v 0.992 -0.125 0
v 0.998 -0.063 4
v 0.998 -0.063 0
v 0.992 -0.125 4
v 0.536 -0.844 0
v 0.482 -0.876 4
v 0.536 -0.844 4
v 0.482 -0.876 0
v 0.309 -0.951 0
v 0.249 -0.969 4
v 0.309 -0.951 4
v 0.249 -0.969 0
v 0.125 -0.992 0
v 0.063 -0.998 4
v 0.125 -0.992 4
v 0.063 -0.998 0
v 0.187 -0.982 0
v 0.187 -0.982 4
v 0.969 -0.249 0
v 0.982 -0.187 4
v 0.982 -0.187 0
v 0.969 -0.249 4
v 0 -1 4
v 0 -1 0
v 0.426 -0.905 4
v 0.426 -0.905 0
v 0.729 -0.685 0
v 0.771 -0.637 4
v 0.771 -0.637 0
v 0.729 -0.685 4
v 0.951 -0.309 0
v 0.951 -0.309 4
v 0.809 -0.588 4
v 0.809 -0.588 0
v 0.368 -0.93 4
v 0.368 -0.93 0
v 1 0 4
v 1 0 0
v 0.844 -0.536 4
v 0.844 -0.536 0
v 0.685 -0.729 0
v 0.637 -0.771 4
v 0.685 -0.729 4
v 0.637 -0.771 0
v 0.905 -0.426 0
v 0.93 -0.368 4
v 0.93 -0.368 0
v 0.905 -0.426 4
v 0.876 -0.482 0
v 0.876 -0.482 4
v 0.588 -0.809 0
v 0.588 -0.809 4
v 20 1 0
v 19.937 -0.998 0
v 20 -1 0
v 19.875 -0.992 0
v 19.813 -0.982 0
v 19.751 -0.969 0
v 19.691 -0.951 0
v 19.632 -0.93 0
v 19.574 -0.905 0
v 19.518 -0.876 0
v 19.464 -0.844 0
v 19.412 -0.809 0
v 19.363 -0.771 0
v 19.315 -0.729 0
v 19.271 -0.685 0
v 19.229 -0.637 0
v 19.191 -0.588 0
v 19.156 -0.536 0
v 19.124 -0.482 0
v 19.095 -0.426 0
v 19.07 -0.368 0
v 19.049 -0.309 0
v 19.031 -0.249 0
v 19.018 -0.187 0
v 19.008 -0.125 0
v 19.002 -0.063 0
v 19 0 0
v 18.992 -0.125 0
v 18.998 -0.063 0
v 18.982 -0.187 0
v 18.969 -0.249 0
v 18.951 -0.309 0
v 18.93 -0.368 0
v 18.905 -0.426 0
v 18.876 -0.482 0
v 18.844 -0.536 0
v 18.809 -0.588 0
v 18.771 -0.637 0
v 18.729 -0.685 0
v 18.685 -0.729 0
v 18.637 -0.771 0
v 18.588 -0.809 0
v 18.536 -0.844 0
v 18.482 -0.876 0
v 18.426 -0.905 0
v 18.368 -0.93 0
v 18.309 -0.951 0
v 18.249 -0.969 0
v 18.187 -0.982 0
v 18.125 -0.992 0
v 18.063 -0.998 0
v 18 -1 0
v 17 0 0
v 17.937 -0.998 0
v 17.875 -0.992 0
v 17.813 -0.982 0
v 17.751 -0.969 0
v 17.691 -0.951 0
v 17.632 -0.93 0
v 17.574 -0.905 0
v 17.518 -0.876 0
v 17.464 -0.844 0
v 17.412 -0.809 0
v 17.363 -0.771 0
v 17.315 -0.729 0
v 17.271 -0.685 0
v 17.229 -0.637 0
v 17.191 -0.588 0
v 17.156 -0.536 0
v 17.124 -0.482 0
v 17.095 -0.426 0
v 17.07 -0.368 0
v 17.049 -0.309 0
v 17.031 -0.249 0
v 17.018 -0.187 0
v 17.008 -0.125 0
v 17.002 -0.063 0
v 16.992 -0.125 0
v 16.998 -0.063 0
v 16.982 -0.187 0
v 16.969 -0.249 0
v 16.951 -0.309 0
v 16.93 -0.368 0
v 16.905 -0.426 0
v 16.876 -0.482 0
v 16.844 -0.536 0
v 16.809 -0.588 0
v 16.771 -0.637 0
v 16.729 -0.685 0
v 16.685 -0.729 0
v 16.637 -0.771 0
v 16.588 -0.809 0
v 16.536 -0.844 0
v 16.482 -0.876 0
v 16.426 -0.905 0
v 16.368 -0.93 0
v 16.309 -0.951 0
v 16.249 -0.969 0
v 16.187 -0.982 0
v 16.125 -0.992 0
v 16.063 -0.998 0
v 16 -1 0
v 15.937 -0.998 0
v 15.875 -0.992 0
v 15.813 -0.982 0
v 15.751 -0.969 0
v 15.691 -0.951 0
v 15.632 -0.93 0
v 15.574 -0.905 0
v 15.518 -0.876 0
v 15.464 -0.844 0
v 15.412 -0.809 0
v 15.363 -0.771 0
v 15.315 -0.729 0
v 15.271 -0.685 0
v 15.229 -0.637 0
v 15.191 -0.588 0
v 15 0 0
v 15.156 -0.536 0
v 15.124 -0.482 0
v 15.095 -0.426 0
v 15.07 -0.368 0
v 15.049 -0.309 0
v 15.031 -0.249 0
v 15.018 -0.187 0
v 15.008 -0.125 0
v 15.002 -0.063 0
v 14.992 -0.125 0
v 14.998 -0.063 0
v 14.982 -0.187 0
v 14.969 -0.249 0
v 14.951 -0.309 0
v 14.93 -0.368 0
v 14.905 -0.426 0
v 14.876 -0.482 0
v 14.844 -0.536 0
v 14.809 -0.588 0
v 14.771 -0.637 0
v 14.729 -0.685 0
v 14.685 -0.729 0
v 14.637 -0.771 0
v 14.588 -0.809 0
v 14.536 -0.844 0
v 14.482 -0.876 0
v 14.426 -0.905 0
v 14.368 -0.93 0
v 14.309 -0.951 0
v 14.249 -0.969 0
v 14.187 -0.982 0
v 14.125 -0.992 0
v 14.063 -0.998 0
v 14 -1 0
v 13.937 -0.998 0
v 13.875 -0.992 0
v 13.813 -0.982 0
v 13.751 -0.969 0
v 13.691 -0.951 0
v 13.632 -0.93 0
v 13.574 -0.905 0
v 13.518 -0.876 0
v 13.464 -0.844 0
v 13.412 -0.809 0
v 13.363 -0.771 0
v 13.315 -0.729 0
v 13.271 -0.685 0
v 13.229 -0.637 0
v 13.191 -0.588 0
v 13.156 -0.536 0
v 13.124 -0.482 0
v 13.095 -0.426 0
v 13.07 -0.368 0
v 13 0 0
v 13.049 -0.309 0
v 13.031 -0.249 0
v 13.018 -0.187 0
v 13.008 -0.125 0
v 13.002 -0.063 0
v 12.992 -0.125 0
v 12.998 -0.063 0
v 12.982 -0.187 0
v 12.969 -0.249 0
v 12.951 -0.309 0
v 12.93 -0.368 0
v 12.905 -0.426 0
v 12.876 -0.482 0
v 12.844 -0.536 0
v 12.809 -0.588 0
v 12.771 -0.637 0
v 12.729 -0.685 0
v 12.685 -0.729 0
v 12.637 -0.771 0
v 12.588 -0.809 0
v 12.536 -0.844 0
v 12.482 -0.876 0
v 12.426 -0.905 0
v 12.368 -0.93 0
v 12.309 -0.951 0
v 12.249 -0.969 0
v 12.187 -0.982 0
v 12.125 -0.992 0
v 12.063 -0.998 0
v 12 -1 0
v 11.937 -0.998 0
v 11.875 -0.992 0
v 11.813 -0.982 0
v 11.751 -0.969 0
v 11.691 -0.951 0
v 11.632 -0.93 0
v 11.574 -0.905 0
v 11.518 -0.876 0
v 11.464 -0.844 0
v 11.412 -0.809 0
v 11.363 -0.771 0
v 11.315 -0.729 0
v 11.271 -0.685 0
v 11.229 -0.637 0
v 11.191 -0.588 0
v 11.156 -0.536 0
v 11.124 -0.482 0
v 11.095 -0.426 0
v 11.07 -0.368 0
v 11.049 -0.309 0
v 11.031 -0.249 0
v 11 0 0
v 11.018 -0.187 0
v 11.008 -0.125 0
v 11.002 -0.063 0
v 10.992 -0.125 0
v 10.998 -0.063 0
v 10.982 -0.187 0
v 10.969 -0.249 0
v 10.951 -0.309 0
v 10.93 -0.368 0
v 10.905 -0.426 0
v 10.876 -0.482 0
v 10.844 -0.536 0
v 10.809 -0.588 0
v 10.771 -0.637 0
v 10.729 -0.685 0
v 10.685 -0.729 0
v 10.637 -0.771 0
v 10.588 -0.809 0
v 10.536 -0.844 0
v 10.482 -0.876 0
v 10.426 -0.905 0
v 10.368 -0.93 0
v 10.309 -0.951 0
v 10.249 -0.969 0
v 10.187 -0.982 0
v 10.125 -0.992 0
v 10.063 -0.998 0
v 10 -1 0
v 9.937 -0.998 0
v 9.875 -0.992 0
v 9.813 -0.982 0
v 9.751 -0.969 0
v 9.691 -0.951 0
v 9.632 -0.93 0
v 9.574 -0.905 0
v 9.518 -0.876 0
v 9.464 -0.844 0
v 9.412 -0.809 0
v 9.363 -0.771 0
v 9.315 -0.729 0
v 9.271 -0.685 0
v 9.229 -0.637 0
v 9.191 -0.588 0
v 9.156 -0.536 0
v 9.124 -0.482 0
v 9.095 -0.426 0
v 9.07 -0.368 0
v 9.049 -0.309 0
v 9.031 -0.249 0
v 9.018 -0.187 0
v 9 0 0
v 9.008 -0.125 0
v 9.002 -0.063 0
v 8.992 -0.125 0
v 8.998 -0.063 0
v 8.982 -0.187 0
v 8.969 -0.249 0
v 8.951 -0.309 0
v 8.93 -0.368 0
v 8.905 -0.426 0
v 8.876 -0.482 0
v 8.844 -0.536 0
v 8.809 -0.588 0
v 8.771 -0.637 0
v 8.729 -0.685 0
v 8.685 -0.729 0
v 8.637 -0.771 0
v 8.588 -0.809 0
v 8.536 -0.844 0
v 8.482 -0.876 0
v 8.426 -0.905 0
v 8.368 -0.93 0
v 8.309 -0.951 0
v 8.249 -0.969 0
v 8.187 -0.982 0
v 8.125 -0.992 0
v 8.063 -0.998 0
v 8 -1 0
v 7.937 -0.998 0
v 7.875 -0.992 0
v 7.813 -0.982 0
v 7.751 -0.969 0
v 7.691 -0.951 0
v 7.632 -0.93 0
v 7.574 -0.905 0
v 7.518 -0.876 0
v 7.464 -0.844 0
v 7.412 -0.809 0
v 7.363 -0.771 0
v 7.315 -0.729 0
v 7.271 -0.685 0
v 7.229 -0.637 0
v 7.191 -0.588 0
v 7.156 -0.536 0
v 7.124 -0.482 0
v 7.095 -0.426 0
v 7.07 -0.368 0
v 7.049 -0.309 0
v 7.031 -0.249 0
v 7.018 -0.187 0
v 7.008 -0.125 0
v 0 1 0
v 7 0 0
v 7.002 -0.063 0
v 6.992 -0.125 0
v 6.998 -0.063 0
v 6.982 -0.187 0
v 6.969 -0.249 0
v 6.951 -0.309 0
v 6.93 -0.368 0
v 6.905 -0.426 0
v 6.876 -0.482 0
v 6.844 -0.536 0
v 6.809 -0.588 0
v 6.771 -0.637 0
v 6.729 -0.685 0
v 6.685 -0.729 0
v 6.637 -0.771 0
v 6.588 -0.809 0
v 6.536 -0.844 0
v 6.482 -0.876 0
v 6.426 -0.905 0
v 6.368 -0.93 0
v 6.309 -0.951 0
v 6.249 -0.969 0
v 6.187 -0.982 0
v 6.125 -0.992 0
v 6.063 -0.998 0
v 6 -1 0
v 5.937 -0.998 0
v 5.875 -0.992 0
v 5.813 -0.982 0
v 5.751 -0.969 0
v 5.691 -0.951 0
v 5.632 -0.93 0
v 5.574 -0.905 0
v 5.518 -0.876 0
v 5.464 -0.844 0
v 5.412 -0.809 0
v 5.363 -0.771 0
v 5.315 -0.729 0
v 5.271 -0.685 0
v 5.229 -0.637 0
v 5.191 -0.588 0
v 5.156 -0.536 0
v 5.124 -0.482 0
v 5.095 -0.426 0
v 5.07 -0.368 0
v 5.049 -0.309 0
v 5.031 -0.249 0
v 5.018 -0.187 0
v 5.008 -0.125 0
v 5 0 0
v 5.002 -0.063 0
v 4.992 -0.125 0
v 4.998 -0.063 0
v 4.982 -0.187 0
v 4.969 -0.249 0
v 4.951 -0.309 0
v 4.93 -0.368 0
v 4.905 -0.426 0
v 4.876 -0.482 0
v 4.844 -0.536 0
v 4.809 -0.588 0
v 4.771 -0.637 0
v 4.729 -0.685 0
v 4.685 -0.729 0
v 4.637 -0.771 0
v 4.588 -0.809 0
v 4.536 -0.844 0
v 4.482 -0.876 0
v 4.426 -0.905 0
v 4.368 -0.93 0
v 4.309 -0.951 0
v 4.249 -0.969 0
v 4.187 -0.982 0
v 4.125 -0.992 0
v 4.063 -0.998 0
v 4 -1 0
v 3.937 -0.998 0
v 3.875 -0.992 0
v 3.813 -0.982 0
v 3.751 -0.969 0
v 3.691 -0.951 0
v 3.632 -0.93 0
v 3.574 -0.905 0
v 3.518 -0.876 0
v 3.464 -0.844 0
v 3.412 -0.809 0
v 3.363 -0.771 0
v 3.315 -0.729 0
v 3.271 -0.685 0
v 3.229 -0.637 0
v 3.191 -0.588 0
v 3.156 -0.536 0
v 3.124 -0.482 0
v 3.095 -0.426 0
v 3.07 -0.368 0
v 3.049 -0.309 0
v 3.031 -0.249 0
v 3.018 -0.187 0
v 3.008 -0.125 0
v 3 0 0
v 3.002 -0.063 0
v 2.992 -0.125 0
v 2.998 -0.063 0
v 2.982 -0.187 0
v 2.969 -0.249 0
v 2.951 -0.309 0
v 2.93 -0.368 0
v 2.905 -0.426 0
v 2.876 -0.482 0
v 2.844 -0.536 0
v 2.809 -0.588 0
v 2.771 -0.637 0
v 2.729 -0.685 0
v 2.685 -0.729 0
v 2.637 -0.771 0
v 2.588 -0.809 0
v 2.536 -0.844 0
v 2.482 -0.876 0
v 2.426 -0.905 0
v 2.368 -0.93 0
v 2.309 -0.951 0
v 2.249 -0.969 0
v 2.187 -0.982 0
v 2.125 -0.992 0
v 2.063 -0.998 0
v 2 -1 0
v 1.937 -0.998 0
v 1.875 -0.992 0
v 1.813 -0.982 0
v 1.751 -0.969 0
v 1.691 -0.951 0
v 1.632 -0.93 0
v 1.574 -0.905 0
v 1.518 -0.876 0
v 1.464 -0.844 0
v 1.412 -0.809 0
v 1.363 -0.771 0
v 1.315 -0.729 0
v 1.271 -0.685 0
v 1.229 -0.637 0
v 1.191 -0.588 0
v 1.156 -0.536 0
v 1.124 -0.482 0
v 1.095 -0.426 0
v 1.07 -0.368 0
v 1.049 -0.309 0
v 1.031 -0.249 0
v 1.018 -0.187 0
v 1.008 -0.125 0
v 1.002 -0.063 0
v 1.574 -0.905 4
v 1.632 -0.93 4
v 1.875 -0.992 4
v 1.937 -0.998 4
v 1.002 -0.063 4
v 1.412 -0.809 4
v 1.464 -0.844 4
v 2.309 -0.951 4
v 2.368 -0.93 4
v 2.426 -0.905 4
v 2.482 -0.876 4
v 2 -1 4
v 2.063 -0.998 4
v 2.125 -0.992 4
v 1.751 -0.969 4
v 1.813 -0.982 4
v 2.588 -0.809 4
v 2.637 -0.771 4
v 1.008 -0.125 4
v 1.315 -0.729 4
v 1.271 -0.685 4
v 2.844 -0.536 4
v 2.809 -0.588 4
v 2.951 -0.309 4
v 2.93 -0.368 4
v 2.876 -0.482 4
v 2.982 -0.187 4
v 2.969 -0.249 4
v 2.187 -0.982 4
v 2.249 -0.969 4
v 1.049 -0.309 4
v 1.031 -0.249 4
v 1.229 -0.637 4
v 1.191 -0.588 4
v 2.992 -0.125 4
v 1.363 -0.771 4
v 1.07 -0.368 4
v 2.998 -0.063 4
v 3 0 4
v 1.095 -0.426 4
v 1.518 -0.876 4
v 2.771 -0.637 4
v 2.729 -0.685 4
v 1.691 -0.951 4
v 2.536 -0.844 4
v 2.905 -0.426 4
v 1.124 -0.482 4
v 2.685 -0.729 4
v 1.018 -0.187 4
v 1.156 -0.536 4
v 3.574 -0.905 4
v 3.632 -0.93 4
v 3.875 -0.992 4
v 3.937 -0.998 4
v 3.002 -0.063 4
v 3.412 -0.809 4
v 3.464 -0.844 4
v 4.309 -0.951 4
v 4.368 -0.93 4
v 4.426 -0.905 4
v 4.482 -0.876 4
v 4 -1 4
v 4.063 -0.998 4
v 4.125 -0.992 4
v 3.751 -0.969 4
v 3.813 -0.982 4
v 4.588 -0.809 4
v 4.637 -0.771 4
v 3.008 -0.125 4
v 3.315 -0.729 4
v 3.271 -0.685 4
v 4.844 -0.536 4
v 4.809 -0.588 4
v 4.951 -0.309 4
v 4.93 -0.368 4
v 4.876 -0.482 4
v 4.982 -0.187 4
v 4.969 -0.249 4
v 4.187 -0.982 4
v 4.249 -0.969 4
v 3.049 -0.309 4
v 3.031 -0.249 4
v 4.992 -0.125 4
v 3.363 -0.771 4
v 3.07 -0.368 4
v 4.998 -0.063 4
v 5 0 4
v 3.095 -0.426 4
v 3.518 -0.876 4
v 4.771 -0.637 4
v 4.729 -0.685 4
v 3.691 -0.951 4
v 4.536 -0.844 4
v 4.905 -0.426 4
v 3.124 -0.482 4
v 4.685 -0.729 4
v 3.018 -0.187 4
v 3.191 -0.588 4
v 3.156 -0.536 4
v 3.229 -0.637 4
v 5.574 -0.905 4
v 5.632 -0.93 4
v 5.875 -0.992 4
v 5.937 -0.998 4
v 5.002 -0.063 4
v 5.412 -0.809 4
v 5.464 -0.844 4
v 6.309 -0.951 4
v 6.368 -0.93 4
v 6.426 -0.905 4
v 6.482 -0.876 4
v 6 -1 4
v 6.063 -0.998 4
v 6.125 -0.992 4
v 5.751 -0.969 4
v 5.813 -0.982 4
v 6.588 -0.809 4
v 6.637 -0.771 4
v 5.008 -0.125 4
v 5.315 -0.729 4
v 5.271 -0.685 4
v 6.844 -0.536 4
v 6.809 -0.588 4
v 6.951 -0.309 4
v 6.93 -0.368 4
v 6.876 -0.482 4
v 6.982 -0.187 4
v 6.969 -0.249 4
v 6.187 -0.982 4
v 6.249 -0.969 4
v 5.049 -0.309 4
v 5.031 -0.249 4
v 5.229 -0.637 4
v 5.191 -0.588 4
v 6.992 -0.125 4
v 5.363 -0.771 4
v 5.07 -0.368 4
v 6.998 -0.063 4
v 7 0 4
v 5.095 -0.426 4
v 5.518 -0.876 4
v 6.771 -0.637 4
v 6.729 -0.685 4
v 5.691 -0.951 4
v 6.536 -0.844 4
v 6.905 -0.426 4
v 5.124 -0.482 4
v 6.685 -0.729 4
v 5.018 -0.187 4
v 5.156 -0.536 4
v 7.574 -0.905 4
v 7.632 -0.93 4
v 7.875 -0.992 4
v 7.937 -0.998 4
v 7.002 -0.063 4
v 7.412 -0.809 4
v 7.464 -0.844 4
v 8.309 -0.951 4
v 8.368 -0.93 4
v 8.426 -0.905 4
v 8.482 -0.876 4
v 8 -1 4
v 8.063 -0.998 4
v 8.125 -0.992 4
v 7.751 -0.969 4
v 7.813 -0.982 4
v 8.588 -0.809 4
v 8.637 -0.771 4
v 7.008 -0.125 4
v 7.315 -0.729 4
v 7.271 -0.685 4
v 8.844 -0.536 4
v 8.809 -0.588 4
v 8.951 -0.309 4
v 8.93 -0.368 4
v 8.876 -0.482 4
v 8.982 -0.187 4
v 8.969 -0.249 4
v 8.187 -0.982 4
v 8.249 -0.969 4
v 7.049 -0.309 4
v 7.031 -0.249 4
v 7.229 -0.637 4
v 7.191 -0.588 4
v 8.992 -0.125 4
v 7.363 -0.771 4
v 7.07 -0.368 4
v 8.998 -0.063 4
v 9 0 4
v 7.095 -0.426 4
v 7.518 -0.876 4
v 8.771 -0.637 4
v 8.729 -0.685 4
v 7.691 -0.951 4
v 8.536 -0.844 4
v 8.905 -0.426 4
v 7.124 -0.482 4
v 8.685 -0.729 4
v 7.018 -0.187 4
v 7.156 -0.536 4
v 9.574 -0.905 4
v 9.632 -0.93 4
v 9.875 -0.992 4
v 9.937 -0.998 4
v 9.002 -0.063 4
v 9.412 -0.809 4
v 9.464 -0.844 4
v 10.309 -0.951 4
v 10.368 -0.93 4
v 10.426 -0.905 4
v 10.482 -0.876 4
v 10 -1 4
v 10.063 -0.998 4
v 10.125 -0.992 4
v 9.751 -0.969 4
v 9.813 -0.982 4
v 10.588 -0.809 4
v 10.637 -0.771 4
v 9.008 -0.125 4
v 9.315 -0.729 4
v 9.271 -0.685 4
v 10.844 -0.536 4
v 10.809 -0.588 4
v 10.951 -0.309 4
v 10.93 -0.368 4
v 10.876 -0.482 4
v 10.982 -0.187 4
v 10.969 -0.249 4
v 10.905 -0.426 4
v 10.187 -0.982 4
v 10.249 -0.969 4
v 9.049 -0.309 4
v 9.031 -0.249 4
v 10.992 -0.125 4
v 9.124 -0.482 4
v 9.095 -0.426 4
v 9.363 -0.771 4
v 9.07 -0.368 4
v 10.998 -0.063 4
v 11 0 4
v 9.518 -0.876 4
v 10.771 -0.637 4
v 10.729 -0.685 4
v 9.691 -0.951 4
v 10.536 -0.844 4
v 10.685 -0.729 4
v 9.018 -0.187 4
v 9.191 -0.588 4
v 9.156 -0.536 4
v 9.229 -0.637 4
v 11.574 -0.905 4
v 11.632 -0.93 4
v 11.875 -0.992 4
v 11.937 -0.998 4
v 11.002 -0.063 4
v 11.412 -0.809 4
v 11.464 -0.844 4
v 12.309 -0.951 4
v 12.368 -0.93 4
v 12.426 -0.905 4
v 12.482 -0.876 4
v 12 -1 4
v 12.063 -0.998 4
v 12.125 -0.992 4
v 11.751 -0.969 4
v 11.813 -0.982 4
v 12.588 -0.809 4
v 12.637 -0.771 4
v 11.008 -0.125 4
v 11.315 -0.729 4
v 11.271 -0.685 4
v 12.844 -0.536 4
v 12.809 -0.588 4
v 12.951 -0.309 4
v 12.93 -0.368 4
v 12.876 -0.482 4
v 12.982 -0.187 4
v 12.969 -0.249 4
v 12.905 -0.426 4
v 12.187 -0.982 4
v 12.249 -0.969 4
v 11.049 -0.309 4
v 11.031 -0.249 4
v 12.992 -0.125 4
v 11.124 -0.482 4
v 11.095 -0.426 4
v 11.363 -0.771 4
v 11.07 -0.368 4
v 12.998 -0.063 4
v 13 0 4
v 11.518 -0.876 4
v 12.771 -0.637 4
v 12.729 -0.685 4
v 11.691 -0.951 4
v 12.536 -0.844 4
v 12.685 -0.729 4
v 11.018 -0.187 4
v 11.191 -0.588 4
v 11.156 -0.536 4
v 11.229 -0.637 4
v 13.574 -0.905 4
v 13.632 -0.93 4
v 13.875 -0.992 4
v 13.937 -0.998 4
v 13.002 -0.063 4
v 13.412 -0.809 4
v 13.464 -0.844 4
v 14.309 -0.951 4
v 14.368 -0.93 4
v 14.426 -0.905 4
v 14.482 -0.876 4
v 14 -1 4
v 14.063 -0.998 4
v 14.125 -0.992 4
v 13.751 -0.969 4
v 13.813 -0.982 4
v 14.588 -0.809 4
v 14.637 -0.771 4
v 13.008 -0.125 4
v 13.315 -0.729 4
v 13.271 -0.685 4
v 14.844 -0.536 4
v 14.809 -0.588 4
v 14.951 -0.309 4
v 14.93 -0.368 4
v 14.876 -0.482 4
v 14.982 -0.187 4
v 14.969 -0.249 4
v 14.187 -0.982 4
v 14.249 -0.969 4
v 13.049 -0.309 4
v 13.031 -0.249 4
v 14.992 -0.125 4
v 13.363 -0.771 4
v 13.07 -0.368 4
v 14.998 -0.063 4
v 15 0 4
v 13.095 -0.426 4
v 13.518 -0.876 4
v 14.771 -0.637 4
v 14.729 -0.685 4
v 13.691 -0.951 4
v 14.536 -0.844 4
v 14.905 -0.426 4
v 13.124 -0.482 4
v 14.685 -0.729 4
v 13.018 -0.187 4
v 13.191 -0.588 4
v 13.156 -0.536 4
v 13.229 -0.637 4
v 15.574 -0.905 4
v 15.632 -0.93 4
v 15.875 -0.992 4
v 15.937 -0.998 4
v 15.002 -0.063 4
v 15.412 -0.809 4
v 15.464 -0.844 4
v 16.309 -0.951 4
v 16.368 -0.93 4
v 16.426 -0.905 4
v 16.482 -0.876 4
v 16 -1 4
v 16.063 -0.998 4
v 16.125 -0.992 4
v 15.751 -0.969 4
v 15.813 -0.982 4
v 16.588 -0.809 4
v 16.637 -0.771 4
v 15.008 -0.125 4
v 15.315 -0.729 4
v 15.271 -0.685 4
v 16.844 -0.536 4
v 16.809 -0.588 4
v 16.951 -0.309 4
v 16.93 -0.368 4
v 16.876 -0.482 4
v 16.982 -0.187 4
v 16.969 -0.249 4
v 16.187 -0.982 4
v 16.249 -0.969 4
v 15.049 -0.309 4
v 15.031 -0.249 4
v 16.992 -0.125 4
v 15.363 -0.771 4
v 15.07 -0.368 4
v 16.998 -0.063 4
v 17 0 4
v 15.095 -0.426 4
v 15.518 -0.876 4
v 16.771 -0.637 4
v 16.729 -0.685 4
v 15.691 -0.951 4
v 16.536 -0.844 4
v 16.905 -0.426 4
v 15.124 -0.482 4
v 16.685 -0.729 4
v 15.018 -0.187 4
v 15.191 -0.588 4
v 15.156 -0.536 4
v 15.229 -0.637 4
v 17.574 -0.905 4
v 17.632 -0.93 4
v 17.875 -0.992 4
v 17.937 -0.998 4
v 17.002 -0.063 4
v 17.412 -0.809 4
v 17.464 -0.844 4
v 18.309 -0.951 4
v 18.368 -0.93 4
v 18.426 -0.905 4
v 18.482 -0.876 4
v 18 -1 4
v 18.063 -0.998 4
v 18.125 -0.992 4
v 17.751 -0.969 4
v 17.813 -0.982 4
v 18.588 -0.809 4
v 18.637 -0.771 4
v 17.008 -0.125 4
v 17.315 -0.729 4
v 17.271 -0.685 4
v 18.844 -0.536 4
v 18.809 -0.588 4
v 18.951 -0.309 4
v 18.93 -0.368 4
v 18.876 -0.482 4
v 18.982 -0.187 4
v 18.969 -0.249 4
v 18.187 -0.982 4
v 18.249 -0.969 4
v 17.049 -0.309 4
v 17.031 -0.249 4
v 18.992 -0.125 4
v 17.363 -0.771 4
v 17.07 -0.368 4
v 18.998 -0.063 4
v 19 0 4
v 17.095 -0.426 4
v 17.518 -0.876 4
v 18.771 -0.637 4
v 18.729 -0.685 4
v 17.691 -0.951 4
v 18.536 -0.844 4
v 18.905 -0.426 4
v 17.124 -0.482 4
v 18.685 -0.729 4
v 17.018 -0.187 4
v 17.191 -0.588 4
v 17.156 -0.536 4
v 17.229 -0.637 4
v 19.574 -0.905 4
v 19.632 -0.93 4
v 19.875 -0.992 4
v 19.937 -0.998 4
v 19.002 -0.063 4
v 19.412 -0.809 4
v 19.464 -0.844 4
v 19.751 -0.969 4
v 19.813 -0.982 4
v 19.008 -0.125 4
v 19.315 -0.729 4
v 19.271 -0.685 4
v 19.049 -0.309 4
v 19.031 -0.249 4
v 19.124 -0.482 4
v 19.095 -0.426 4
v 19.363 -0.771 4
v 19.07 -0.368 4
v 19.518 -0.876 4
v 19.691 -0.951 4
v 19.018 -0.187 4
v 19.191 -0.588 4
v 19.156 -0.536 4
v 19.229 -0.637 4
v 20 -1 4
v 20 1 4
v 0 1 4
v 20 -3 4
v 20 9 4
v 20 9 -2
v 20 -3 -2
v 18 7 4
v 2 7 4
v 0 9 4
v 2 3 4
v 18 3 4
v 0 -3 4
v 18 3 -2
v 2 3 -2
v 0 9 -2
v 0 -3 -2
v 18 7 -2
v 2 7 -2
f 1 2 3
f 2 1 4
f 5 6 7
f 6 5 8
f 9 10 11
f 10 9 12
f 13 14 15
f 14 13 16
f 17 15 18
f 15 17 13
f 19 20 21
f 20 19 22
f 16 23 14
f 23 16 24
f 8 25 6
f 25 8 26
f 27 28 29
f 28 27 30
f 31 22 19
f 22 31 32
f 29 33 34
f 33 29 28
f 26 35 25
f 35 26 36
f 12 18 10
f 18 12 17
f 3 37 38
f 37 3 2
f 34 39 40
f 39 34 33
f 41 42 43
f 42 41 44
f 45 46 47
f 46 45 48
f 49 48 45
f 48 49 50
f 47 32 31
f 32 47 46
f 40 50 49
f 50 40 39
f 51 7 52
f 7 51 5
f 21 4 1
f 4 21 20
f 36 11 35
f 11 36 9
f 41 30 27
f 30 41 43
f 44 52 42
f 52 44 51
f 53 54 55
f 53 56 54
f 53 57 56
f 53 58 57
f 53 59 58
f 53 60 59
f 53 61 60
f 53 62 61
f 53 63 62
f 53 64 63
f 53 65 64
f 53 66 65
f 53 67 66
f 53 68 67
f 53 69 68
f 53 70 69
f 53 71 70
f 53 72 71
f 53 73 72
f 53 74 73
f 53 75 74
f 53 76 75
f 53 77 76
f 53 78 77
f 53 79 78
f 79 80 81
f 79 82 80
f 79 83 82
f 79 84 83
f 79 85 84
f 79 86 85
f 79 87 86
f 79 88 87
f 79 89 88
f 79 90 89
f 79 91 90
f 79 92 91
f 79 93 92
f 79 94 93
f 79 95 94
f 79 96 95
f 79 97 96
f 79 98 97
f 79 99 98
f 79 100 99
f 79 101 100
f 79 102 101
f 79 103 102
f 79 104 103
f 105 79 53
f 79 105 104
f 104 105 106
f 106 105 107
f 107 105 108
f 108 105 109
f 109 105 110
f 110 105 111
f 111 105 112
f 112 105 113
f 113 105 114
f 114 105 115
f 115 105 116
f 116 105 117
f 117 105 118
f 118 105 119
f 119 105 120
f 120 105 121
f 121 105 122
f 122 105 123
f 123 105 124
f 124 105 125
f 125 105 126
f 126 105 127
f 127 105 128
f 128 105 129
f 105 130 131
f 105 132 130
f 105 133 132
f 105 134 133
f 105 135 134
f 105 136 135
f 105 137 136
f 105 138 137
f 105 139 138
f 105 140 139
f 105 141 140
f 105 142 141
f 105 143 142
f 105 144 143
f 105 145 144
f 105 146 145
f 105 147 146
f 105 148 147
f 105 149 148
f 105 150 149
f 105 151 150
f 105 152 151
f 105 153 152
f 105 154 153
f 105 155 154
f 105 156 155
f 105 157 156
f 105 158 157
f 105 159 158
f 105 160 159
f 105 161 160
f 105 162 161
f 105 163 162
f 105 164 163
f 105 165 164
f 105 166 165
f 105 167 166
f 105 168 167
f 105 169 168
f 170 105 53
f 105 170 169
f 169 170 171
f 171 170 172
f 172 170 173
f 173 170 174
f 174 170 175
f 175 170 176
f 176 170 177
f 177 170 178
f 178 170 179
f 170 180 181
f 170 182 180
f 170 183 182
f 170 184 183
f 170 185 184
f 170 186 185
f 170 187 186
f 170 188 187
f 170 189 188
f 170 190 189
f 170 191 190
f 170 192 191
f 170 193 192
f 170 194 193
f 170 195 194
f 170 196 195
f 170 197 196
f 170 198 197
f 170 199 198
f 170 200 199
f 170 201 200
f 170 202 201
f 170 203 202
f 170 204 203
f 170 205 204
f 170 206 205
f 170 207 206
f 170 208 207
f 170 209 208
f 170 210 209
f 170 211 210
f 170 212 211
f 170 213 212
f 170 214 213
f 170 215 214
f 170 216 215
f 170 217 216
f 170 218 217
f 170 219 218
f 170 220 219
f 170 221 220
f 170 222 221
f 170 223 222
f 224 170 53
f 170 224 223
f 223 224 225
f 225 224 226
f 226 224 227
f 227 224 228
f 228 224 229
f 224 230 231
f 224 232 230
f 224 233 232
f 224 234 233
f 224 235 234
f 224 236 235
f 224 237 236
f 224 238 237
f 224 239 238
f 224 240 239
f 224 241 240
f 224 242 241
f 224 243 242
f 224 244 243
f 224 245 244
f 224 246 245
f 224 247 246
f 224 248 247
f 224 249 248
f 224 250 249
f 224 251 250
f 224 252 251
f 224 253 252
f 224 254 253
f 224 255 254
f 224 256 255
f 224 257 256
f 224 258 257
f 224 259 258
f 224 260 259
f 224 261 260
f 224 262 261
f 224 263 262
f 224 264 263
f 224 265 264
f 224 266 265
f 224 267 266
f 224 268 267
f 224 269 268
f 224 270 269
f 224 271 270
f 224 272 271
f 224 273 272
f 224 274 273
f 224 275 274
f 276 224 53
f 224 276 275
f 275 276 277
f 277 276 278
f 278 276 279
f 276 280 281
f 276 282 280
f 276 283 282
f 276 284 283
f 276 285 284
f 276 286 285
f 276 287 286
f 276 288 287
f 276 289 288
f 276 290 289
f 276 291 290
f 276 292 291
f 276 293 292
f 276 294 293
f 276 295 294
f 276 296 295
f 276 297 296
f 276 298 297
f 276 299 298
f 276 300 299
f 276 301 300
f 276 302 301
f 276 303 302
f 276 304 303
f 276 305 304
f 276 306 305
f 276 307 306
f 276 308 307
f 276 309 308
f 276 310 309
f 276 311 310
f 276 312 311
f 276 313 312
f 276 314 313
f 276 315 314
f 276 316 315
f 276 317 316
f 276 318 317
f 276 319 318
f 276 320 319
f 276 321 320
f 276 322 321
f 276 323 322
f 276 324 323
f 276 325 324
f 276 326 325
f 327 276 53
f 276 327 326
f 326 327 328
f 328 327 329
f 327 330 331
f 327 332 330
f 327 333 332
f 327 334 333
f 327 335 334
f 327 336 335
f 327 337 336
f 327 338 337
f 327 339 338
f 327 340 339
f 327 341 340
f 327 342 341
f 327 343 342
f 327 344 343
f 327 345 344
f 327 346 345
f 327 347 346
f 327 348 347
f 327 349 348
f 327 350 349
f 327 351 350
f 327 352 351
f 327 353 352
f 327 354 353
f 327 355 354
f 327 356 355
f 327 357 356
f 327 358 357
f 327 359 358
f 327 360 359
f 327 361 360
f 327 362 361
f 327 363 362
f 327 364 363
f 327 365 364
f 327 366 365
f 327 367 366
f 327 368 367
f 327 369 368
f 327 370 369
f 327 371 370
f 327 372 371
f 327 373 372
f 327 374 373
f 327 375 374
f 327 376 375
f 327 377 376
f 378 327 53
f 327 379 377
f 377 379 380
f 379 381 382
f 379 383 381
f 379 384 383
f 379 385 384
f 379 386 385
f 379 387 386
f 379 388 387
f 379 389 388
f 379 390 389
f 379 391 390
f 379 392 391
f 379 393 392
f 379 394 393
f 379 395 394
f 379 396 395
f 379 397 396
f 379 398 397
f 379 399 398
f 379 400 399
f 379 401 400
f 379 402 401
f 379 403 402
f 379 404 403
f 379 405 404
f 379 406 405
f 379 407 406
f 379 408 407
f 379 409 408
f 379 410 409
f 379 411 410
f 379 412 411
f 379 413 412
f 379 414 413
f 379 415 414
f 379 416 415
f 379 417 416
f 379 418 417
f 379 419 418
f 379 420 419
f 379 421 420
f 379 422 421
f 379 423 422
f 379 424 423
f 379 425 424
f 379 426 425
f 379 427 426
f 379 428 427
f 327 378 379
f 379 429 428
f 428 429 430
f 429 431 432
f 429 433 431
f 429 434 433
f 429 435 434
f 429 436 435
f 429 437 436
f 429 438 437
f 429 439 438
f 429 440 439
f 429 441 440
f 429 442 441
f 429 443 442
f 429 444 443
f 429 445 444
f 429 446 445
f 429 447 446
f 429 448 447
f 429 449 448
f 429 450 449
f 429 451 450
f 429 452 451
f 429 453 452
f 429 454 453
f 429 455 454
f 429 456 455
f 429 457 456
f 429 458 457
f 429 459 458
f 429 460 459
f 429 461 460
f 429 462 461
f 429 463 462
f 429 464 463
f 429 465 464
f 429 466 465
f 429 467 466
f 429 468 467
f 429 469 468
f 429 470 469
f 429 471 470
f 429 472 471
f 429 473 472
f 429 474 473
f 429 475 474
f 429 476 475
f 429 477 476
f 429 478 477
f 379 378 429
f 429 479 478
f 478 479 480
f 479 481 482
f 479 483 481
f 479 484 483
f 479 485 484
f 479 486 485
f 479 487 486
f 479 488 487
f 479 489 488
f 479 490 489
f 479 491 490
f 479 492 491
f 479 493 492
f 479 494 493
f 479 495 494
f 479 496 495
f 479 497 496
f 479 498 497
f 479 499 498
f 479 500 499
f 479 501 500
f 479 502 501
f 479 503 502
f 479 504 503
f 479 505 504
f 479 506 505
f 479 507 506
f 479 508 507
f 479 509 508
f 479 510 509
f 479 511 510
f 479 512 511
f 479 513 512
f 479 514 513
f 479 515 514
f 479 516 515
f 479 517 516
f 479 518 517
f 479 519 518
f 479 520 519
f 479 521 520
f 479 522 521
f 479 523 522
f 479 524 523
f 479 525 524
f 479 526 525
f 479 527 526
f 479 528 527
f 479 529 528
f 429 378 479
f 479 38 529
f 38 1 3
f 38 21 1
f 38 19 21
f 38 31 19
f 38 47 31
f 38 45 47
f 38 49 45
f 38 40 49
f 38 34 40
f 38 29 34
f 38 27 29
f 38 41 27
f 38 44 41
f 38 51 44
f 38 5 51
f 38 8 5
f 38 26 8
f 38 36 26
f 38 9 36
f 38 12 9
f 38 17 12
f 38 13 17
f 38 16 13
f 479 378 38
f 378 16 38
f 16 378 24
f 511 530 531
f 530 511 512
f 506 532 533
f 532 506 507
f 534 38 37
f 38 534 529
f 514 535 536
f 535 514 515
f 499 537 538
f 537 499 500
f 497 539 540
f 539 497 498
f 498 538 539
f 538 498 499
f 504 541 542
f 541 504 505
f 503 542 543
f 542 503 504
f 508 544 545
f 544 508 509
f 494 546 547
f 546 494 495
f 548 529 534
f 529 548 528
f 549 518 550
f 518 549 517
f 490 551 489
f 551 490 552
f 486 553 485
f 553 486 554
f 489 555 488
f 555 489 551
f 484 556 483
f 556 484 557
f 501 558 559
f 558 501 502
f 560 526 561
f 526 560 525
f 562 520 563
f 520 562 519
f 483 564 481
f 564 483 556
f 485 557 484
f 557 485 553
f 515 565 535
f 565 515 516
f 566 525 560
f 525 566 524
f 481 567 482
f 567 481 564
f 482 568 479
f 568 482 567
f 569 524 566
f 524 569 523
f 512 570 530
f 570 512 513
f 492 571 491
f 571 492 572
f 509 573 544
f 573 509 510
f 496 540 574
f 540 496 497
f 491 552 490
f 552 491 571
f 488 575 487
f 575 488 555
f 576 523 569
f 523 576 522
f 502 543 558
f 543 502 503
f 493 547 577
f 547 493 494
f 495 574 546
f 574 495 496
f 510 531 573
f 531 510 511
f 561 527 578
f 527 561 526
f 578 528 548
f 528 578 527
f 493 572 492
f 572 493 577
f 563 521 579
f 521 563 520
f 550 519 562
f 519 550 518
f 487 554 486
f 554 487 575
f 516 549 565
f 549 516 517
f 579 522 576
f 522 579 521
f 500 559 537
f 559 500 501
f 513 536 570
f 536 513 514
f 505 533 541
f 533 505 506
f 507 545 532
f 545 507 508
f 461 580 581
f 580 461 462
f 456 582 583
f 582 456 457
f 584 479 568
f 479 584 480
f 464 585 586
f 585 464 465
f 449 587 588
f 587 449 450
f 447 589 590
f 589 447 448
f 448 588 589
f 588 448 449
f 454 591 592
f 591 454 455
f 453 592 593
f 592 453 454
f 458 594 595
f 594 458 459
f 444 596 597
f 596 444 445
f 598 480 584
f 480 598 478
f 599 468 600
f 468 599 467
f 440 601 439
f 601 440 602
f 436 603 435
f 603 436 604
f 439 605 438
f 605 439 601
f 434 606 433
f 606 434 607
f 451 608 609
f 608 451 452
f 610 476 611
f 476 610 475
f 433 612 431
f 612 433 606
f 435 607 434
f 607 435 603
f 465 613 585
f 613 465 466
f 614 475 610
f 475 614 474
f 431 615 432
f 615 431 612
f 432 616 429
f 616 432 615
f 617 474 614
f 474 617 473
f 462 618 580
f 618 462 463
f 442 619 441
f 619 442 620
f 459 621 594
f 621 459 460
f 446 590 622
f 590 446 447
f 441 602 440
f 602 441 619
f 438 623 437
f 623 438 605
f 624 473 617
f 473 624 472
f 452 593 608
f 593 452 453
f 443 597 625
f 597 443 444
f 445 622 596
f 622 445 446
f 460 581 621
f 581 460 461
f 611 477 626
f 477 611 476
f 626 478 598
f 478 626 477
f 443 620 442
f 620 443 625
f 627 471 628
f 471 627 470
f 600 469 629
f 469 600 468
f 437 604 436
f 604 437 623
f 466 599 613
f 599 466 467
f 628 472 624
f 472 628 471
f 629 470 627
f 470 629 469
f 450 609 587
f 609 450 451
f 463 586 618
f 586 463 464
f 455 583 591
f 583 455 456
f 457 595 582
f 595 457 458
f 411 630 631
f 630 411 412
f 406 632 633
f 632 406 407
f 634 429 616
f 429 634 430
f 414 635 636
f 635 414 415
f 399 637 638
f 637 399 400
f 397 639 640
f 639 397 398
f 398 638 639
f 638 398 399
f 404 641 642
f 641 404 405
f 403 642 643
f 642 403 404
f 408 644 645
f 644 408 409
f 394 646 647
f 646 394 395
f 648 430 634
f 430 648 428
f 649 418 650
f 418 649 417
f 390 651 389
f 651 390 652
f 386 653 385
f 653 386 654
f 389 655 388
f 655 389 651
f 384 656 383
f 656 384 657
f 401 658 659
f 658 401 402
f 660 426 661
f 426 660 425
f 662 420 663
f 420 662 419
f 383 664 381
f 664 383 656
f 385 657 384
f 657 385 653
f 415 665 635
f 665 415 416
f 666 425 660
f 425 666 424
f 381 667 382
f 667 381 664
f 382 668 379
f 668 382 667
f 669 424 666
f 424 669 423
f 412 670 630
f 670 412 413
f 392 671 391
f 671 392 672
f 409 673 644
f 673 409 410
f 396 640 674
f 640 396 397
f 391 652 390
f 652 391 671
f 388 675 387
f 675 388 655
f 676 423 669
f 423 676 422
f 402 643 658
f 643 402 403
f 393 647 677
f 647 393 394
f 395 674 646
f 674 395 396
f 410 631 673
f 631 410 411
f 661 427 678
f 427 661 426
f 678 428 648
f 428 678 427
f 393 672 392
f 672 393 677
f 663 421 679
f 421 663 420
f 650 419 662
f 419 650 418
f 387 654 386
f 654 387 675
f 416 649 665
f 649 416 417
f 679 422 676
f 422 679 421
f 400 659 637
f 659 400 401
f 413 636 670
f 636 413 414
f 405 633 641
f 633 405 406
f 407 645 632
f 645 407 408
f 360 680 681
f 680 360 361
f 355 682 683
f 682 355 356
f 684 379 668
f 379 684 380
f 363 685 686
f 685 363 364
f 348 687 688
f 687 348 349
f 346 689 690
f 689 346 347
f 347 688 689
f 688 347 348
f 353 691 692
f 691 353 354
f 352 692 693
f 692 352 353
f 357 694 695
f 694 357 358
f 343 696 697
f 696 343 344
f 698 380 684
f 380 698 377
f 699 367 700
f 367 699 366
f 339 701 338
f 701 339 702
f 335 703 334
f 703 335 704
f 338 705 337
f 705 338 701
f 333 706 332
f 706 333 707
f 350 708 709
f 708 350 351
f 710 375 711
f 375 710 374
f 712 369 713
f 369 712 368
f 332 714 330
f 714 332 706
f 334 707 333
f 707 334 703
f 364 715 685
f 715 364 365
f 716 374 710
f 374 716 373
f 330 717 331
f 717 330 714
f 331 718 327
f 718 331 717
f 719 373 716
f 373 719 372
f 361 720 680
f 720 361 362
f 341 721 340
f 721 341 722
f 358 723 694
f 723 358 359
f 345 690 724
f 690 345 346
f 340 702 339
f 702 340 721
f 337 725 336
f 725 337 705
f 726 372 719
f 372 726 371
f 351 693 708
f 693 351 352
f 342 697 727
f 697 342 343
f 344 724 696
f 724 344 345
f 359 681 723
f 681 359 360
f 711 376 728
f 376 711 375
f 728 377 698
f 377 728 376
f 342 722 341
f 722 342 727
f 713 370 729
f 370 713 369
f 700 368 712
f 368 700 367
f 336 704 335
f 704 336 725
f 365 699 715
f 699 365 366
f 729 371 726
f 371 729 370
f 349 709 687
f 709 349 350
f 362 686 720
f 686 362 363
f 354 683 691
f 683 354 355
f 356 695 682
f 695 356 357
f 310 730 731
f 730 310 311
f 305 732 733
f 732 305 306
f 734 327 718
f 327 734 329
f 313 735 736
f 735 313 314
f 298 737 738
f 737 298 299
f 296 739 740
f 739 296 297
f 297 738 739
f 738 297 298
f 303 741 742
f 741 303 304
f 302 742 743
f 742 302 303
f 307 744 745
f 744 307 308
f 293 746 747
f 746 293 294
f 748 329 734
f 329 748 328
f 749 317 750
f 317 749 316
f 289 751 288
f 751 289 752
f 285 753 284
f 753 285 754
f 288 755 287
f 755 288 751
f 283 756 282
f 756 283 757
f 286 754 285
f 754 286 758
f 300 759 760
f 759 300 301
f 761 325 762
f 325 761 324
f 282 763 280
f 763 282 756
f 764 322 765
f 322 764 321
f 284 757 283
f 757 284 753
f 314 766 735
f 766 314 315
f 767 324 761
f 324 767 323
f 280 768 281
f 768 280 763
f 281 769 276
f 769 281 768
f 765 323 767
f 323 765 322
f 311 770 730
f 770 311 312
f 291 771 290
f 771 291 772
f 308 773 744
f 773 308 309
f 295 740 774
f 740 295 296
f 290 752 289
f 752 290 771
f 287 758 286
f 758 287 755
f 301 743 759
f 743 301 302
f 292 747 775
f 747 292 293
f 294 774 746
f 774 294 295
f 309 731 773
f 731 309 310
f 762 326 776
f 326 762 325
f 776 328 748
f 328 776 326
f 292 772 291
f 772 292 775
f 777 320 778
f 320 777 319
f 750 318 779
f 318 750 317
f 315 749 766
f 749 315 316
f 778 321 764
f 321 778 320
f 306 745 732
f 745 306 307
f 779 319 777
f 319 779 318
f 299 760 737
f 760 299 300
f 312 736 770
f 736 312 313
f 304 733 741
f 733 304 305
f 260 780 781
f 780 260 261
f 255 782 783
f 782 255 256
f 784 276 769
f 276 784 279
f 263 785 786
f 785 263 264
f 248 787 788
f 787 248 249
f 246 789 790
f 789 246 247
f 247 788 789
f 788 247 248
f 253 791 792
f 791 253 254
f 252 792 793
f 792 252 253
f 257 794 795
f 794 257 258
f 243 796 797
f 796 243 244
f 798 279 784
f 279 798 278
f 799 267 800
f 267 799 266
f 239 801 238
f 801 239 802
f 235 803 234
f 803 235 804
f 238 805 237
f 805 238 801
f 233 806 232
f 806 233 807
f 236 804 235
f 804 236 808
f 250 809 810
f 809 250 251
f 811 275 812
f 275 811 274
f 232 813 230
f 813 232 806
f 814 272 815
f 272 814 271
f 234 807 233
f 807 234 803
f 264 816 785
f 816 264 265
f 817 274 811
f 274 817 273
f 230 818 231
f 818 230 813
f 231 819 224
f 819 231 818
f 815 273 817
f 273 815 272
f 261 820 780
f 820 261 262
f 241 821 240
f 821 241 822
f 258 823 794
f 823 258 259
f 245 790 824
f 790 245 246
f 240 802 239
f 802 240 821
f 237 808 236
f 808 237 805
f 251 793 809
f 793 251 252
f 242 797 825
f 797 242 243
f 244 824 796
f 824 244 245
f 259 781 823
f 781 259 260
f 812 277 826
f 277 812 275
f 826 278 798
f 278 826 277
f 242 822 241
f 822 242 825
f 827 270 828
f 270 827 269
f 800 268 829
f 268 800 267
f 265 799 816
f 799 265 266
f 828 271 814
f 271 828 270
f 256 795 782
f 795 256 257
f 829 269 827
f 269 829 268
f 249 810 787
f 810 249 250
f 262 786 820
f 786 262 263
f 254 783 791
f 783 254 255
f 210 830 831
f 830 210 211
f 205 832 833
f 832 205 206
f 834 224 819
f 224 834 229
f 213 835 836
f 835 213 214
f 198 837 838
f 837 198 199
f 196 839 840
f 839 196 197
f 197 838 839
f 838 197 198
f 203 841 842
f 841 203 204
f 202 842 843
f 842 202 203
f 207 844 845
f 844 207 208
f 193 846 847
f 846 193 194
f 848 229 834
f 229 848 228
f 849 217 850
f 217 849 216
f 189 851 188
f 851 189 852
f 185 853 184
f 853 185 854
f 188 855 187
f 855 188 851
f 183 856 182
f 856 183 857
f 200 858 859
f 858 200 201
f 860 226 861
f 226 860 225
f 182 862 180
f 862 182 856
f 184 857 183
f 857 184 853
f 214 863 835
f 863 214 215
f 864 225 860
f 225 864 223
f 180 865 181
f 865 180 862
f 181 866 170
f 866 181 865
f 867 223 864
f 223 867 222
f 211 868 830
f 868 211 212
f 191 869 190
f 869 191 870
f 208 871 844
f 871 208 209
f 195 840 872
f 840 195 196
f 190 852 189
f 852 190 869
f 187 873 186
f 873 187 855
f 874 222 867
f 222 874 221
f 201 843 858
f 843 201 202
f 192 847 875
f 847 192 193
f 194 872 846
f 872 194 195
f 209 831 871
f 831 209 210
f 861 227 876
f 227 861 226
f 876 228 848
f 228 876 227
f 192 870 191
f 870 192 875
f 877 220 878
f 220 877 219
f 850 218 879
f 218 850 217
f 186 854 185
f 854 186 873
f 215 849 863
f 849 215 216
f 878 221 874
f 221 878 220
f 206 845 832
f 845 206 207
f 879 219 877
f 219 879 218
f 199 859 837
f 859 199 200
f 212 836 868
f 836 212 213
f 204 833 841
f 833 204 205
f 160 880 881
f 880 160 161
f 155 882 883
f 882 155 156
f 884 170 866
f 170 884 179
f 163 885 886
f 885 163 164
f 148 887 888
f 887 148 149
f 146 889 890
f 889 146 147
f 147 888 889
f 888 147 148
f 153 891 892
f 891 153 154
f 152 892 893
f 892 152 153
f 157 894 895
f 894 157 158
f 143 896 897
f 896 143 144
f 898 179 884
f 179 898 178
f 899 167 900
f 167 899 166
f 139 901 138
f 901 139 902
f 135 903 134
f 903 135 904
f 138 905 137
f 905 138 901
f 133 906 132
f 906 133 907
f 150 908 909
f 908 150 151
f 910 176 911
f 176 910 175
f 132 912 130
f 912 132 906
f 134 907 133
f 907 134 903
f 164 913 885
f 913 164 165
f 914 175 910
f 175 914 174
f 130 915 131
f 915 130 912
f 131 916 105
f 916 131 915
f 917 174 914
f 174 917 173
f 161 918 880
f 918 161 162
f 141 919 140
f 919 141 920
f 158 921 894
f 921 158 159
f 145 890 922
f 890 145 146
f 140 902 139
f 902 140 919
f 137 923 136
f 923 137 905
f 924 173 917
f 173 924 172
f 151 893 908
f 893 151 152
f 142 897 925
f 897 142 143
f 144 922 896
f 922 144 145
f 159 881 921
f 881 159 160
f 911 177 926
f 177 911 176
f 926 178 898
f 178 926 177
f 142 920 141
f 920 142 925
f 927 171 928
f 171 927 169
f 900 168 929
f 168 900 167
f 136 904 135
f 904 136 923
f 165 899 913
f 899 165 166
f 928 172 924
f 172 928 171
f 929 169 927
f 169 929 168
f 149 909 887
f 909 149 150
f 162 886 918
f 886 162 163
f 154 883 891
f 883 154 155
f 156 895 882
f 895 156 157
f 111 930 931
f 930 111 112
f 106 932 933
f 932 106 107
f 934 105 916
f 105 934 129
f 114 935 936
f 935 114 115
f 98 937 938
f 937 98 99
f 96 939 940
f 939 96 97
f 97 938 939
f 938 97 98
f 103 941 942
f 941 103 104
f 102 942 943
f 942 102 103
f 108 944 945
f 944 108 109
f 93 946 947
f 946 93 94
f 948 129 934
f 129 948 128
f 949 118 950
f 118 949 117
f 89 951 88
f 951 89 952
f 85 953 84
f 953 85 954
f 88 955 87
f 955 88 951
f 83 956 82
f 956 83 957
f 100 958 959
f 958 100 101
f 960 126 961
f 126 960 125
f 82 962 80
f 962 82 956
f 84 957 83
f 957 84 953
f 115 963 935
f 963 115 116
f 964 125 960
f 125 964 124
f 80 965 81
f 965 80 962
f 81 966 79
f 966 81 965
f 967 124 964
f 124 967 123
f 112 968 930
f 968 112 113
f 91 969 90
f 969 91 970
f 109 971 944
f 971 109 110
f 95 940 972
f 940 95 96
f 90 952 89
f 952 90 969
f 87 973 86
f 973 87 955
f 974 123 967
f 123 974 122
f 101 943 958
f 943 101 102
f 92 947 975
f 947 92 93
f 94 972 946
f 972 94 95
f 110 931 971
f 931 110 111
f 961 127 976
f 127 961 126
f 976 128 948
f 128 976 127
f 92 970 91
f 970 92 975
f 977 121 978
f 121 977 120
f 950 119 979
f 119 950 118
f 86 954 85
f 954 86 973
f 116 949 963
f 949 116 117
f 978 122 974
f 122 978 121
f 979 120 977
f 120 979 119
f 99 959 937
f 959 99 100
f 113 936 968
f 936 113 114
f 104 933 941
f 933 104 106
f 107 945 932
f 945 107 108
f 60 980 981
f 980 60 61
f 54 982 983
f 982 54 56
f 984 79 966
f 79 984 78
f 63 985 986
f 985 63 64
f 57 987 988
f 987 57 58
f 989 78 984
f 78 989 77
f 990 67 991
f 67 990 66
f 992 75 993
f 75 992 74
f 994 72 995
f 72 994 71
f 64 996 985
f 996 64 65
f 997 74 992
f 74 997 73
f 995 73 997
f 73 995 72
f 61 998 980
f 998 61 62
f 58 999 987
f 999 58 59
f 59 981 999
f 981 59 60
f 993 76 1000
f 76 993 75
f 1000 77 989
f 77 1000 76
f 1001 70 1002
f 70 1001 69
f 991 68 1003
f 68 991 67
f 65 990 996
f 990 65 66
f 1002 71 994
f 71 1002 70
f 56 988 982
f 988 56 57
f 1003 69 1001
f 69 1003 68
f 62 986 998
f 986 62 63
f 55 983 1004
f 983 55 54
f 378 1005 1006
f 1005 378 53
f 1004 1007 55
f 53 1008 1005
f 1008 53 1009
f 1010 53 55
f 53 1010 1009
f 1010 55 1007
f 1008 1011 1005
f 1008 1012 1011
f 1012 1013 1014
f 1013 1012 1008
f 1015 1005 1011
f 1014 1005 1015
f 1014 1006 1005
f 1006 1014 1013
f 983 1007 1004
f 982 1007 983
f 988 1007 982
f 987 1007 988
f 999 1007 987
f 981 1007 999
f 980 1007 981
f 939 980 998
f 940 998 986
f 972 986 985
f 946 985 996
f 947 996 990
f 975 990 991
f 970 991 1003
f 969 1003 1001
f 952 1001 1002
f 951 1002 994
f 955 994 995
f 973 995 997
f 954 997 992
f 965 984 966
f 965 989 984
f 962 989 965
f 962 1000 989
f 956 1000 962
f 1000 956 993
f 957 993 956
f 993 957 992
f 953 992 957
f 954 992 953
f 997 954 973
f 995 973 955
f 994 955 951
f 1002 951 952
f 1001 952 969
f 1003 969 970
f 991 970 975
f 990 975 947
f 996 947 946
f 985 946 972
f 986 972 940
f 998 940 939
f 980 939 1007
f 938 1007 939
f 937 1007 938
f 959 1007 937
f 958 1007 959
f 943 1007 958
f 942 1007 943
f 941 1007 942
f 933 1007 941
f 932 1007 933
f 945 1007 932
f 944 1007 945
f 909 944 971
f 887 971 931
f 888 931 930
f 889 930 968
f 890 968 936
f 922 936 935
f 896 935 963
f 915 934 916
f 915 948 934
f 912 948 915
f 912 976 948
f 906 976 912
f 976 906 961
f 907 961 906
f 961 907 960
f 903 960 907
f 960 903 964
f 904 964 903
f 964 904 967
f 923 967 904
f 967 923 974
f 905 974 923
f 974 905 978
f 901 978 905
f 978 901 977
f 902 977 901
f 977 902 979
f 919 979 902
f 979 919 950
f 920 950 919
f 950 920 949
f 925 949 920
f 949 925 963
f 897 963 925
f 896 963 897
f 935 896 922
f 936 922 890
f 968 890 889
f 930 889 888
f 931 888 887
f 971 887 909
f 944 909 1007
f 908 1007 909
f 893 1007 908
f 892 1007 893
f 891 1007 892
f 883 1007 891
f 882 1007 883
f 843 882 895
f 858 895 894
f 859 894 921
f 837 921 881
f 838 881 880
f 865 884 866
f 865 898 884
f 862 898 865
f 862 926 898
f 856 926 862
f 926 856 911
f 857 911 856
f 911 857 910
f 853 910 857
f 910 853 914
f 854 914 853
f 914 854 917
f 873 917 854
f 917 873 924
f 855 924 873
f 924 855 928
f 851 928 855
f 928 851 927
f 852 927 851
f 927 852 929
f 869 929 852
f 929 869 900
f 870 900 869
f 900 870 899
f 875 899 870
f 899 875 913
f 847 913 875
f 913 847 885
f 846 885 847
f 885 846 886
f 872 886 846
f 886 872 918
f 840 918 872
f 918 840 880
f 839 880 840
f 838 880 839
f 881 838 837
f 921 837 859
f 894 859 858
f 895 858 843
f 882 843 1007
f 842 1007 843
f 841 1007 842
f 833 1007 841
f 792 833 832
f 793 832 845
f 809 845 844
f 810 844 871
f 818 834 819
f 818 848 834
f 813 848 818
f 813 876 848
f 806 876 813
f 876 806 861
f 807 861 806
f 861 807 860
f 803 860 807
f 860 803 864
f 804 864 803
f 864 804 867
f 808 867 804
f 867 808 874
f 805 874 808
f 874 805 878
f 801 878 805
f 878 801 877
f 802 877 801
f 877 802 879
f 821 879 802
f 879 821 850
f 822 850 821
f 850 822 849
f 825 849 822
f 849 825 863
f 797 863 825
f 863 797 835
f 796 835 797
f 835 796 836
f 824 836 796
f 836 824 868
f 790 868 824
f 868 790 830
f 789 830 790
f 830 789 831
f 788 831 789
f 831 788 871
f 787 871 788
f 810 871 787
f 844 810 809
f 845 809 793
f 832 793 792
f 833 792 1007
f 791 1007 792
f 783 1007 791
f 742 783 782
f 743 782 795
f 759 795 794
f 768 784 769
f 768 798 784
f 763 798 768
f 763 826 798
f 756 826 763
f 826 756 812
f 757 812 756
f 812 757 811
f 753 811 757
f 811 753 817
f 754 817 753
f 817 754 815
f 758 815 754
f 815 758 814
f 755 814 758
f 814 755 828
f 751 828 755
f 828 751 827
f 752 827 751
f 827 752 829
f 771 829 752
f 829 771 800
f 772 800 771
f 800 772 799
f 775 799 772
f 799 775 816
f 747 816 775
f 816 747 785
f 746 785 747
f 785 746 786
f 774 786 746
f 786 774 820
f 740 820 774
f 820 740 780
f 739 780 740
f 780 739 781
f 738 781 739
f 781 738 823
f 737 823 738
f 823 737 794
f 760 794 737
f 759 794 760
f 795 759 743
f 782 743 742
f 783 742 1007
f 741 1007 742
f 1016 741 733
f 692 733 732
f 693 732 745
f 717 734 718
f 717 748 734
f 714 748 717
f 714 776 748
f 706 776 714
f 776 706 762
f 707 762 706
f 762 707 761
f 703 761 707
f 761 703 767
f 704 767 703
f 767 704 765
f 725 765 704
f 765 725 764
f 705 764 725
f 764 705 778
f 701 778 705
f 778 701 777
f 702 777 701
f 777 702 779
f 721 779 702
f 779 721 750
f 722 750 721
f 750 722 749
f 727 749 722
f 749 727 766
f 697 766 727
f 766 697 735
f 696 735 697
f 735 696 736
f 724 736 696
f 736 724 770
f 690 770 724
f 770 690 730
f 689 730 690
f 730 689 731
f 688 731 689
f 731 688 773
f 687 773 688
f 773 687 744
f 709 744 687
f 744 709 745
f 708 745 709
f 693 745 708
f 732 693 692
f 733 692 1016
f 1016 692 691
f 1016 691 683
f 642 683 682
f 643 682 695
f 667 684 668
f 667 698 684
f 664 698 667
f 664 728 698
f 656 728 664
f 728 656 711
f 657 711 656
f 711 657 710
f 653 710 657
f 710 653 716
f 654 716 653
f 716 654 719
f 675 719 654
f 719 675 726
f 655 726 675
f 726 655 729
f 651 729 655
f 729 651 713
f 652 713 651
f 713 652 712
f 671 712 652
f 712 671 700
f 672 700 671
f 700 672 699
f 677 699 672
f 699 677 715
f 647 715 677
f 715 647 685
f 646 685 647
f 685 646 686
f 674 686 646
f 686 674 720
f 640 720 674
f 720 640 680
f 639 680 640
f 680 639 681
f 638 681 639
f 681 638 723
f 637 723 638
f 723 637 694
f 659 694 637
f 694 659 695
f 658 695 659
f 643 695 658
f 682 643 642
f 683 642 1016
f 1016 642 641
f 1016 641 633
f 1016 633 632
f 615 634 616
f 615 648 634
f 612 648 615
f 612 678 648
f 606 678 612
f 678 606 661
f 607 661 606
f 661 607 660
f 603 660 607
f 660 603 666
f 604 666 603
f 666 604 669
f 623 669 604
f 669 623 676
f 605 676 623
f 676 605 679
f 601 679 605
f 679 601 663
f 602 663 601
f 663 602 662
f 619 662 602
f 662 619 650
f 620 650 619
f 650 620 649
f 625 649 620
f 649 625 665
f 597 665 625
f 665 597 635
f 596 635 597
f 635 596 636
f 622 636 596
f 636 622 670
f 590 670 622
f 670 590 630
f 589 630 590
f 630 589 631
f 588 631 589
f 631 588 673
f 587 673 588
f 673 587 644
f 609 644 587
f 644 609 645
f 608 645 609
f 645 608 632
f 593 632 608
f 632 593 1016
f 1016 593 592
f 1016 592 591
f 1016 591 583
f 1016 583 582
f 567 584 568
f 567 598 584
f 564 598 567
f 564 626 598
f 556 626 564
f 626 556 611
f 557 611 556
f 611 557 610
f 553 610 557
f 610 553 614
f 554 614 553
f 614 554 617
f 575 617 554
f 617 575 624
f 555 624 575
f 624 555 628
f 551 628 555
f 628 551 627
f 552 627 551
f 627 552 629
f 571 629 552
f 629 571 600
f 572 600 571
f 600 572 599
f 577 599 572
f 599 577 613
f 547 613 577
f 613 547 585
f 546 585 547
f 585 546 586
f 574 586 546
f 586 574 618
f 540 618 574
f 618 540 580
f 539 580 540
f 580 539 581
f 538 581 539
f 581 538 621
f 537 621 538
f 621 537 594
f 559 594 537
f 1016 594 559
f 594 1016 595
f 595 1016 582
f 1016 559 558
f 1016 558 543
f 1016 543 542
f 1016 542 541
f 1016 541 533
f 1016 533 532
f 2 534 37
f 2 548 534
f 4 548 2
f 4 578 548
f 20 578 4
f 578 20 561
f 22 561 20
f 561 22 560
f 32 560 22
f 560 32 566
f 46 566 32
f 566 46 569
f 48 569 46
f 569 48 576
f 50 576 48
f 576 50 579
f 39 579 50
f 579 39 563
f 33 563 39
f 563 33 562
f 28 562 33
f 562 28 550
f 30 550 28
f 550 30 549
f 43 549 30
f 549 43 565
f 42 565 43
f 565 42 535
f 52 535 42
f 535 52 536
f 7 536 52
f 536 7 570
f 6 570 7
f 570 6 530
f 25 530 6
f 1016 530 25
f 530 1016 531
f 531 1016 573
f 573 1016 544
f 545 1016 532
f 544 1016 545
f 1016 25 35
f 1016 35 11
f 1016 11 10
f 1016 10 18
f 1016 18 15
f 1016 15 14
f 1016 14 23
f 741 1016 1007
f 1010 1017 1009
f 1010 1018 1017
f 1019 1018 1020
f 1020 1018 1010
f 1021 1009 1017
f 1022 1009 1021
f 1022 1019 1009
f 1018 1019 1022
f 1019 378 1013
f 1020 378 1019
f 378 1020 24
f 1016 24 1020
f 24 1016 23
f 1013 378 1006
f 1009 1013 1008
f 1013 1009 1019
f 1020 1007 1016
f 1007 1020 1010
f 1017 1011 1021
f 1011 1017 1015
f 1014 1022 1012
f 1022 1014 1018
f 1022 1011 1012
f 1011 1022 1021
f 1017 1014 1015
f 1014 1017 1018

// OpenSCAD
$fn = 100; 

difference() {

translate( [0,-3,-2] ) cube( [20, 12, 6] ); // block
translate( [2,3,-2] ) cube( [16, 4, 6] ); 
    
union() { // belt 
    translate( [0,0,0] ) cube( [20,1,6] ); 
    for (i=[0:12]) {
        translate( [2*i,0,0] ) cylinder( r=1, h=8 ); 
    }
}

    

}

//translate( [0,0.5,-2] ) cube( [20,2,6] ); 
